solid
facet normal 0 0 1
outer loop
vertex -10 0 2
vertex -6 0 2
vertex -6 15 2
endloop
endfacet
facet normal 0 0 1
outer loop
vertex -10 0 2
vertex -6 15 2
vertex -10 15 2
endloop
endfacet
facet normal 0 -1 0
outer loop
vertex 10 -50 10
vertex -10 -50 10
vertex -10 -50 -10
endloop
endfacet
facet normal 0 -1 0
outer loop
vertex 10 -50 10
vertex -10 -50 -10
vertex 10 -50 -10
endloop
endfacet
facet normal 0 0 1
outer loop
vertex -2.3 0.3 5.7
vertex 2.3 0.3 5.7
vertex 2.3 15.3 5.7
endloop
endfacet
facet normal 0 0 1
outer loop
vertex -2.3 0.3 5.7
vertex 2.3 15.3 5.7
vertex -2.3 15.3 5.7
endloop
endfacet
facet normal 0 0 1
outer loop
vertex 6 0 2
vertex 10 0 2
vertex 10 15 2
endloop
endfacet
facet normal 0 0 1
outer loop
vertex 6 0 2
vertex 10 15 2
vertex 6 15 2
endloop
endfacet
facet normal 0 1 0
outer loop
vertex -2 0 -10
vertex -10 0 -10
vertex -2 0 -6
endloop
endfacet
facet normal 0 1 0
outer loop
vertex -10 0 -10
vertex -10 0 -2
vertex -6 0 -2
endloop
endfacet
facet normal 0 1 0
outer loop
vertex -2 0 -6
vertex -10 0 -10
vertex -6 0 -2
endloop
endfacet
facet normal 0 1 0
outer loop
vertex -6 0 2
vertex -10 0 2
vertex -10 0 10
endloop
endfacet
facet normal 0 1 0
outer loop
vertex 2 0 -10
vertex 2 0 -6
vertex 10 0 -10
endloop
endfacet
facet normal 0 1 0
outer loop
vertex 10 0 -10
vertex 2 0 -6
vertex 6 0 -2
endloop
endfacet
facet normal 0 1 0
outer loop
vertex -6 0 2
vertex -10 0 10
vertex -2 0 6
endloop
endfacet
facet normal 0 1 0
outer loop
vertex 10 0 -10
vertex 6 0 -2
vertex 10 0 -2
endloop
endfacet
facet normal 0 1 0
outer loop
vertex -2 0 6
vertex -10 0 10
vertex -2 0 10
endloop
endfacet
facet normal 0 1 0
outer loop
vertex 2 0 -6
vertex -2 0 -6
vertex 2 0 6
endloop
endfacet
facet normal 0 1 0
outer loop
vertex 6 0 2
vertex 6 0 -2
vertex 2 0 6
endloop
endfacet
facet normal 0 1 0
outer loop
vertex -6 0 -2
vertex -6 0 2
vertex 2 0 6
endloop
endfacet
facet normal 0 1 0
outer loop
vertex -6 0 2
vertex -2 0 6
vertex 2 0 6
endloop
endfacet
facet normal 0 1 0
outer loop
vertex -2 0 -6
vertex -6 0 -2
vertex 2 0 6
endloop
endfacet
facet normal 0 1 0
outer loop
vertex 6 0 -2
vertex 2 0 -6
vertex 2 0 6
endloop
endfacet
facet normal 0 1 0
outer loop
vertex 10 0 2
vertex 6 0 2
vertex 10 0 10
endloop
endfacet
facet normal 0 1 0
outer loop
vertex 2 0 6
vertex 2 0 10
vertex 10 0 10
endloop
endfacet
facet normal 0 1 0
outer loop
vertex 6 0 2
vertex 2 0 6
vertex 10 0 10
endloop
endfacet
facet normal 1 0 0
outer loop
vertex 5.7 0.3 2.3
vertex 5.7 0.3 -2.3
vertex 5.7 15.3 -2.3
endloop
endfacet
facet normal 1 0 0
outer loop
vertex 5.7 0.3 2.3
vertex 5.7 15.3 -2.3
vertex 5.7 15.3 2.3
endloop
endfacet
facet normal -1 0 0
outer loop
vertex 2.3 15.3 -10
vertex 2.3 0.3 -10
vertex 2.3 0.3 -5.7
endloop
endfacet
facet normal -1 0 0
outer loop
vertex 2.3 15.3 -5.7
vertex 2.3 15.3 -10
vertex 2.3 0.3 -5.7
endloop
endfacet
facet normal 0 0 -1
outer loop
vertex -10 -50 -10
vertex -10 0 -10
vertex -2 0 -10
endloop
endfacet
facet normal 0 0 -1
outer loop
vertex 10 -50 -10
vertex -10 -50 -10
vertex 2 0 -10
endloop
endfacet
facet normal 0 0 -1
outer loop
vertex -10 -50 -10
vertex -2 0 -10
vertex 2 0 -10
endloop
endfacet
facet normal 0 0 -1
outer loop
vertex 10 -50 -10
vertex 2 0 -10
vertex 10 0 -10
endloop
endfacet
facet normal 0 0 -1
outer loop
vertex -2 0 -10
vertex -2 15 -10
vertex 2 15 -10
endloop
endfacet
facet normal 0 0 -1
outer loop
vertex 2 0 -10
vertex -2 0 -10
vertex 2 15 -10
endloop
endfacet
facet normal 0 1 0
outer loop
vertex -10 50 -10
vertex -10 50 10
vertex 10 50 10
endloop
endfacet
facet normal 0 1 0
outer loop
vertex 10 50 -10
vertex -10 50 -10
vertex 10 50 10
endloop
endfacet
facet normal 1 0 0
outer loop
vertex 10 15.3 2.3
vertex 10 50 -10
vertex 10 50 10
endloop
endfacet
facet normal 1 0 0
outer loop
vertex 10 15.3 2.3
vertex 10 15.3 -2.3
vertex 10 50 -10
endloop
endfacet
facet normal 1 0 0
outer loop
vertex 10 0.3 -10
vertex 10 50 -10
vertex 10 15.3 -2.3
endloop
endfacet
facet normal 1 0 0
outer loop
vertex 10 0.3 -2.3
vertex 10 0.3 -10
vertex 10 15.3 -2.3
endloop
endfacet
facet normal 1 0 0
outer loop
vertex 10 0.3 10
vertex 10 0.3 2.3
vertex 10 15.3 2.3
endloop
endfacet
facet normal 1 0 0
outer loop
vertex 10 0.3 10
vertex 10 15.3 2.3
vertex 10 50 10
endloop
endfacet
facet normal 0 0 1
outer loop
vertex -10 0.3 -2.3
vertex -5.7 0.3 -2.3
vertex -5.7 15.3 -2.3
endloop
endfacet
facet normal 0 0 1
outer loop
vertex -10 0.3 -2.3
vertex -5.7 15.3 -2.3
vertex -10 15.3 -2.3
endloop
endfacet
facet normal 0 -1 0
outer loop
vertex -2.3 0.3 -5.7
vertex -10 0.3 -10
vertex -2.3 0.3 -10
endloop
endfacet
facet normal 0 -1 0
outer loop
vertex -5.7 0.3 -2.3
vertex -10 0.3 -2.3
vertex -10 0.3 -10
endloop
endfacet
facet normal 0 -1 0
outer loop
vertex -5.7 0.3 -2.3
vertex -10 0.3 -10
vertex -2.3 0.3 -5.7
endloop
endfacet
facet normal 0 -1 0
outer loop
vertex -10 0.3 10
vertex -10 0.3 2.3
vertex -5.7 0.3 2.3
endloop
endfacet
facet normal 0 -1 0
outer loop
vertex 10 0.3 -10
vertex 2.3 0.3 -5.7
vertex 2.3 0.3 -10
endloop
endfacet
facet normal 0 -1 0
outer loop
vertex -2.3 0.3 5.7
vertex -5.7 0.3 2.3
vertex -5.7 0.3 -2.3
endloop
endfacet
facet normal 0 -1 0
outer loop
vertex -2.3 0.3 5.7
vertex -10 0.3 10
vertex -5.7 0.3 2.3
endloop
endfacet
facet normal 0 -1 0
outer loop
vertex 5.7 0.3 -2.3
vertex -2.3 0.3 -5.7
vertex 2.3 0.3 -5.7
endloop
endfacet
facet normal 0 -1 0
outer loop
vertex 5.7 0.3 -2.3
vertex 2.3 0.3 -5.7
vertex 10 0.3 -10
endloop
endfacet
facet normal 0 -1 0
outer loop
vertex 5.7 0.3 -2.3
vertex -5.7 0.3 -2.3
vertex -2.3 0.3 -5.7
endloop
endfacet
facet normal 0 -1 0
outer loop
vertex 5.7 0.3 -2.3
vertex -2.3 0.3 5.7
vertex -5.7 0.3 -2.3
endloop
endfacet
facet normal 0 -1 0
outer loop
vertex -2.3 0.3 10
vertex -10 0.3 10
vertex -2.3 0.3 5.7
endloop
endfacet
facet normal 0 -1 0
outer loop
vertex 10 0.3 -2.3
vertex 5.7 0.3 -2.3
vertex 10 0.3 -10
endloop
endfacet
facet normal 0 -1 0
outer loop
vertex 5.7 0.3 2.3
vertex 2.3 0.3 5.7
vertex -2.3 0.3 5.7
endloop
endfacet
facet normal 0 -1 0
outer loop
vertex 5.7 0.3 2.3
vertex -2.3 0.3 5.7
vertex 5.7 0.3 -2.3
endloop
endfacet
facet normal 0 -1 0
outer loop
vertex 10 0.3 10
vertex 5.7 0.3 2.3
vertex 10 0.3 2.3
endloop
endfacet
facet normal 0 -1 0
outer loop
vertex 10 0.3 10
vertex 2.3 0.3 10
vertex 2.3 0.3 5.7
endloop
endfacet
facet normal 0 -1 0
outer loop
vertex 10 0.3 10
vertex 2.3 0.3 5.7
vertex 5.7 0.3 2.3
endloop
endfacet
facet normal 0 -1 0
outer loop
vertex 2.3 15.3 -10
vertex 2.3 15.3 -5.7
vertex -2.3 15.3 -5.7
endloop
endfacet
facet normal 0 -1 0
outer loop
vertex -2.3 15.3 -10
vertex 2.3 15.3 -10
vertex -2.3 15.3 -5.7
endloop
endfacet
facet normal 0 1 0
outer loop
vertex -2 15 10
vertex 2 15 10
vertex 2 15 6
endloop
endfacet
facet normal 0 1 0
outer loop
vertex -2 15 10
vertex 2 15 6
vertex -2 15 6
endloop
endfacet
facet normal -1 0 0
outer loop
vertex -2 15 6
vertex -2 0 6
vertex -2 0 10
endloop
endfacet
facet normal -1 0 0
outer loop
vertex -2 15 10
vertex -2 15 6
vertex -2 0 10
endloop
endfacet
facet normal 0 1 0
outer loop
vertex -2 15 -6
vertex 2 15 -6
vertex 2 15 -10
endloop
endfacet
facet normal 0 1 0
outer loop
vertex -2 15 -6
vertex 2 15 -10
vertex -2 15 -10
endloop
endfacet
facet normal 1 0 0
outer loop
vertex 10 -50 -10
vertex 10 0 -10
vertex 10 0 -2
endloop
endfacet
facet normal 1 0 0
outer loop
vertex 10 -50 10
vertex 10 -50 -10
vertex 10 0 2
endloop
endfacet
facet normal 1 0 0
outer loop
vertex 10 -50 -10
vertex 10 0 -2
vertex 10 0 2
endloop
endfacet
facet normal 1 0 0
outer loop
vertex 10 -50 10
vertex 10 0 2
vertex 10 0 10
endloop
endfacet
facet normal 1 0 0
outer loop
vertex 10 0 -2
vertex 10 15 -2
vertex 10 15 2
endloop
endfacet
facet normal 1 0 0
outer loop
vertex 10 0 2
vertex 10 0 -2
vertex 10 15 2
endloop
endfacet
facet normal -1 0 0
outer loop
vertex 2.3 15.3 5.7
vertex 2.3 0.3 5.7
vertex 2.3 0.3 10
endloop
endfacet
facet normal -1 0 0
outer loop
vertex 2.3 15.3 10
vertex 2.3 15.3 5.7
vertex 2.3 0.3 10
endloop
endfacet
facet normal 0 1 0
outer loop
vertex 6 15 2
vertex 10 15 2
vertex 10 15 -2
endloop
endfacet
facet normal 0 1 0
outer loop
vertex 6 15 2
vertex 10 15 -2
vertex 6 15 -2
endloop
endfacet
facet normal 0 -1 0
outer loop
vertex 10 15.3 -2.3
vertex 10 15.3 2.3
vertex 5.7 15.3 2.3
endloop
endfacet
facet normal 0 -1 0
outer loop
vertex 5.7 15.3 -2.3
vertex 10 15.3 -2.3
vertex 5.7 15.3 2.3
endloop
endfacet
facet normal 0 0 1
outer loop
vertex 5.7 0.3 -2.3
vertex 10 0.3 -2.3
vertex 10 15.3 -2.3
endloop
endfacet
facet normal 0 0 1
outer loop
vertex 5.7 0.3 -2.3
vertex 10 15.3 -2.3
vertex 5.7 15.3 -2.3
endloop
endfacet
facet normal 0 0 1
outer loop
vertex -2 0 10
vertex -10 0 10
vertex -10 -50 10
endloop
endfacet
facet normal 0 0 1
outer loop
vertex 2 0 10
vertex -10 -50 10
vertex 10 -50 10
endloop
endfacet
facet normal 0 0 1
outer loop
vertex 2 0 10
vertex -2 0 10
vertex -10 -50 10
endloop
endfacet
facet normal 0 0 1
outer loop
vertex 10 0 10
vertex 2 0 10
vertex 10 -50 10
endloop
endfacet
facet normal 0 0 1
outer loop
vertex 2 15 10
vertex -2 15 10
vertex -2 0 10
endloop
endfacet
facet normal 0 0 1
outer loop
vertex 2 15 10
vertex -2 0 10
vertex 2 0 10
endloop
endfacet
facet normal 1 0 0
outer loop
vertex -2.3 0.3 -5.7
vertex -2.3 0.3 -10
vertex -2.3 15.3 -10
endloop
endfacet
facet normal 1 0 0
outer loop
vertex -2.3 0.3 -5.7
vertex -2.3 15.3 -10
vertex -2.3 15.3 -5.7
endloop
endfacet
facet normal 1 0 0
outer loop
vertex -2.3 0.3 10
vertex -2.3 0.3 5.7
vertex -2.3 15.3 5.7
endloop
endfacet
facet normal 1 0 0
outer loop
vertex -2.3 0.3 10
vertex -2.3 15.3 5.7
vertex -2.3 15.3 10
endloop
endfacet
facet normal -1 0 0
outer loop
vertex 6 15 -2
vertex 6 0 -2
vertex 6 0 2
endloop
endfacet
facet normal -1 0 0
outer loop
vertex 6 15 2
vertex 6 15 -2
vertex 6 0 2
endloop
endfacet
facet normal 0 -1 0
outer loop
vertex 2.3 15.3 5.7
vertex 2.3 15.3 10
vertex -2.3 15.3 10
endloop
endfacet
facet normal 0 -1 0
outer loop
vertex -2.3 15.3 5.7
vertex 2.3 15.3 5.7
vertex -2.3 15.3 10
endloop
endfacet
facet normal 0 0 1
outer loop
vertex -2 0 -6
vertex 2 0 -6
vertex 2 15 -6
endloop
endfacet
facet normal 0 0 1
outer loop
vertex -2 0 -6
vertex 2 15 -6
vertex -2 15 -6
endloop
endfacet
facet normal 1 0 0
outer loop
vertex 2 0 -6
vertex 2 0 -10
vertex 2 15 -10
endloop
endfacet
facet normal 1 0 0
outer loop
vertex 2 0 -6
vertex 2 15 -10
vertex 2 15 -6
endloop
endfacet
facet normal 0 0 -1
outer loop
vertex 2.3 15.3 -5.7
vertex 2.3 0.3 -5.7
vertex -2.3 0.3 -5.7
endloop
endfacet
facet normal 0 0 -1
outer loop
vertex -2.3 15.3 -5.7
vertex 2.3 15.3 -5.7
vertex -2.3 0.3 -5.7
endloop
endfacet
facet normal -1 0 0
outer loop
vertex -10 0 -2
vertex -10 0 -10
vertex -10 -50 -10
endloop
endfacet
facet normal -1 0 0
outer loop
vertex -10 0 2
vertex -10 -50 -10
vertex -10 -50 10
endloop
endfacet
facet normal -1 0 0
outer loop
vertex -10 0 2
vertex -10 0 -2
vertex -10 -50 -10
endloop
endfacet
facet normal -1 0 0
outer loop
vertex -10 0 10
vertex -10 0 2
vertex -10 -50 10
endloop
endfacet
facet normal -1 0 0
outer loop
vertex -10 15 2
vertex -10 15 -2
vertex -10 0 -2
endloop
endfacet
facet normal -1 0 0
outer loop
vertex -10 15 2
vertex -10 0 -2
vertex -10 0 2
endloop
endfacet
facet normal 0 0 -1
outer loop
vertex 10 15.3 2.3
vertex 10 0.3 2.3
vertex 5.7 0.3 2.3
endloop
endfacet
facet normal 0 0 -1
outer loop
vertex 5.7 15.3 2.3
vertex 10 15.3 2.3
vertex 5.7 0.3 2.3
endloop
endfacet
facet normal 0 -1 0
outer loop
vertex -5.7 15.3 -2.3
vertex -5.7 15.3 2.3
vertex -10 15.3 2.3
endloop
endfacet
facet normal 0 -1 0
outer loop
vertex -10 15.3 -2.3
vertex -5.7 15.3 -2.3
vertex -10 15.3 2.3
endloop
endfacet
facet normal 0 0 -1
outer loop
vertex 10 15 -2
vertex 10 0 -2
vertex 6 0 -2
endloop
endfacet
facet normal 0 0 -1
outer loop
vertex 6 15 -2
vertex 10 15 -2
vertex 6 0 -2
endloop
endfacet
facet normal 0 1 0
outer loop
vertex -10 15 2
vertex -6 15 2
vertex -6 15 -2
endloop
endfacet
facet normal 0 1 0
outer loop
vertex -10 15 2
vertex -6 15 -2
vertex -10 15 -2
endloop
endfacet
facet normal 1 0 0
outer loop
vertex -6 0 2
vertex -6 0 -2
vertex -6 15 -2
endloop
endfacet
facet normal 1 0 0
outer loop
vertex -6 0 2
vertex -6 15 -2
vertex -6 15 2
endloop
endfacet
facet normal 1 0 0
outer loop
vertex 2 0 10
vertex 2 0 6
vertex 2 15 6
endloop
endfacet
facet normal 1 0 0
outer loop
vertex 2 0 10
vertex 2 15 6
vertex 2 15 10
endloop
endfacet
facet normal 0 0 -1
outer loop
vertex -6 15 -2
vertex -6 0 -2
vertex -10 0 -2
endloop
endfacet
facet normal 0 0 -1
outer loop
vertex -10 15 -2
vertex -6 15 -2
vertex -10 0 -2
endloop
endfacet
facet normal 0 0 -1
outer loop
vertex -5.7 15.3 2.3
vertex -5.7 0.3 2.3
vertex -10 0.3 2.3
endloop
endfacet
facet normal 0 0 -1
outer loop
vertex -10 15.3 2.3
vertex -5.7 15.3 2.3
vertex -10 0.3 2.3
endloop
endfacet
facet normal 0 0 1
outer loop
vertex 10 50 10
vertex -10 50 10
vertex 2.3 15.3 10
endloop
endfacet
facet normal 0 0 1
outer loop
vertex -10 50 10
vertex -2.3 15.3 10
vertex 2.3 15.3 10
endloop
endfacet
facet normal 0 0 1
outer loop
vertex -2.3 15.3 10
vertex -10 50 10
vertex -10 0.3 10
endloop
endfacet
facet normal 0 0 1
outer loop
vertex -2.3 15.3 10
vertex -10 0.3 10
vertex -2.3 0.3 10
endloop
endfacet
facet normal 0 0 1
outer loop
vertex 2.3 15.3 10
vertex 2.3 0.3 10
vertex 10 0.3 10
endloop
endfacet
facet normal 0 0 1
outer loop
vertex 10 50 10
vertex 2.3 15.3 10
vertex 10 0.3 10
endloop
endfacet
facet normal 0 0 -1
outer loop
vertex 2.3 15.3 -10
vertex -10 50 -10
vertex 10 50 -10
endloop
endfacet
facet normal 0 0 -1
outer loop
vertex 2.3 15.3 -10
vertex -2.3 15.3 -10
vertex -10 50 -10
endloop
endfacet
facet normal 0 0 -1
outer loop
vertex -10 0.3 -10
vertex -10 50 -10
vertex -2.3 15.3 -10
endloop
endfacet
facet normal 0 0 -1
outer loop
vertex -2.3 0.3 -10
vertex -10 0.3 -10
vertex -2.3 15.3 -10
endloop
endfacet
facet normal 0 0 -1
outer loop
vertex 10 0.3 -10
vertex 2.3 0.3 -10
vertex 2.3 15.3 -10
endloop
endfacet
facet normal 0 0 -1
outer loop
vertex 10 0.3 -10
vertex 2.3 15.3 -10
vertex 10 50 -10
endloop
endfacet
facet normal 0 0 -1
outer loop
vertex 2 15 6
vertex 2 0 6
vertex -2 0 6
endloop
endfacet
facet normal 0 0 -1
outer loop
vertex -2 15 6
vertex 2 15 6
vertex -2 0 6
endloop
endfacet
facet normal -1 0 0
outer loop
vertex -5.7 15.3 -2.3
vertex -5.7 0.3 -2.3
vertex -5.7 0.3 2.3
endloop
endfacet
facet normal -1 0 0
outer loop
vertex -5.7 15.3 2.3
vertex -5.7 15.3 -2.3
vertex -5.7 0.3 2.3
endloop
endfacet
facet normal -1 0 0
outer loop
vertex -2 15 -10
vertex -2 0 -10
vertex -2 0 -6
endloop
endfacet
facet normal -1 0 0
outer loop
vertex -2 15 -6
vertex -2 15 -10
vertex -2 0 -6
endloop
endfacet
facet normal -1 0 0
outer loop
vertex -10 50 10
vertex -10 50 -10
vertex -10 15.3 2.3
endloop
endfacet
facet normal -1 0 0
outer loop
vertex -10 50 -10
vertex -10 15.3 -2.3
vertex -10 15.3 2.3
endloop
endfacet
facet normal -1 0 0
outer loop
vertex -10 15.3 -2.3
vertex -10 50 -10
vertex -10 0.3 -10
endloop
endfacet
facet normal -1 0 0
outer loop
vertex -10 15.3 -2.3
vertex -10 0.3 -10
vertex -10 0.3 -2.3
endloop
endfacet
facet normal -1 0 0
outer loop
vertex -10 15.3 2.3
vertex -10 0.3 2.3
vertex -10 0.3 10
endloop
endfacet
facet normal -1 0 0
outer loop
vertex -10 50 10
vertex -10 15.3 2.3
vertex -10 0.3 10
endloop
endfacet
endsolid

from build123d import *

# Parameters (mm, degrees)
F0_W      = 20
F0_H      = 20
F1_DEPTH  = 50
F2_W      = 4
F2_H      = 4
F3_DEPTH  = 15
F4_W      = 20
F4_H      = 20
F5_DEPTH  = 50
F6_OFFSET = 0.3


with BuildPart() as f1:
    # F0 (on Front) → F1 (new body)
    with BuildSketch(Plane.XZ):
        Rectangle(F0_W, F0_H)
    extrude(amount=F1_DEPTH)

    # F2 (on face) → F3 (join)
    with BuildSketch(Plane(origin=(0, 0, 0), x_dir=(-1, 0, 0), z_dir=(0, 1, 0))):
        with Locations((0, 8)):
            Rectangle(F2_W, F2_H)
        with Locations((0, -8)):
            Rectangle(F2_W, F2_H)
        with Locations((-8, 0)):
            Rectangle(F2_W, F2_H)
        with Locations((8, 0)):
            Rectangle(F2_W, F2_H)
    extrude(amount=F3_DEPTH)


with BuildPart() as f5:
    # F4 (on Front) → F5 (new body)
    with BuildSketch(Plane.XZ):
        Rectangle(F4_W, F4_H)
    extrude(amount=-F5_DEPTH)

    # F6: cut F1, made larger all round first
    f6_tool = offset(f1.part, amount=F6_OFFSET, kind=Kind.INTERSECTION, mode=Mode.PRIVATE)
    add(f6_tool, mode=Mode.SUBTRACT)


solid = Compound([f1.part, f5.part])
